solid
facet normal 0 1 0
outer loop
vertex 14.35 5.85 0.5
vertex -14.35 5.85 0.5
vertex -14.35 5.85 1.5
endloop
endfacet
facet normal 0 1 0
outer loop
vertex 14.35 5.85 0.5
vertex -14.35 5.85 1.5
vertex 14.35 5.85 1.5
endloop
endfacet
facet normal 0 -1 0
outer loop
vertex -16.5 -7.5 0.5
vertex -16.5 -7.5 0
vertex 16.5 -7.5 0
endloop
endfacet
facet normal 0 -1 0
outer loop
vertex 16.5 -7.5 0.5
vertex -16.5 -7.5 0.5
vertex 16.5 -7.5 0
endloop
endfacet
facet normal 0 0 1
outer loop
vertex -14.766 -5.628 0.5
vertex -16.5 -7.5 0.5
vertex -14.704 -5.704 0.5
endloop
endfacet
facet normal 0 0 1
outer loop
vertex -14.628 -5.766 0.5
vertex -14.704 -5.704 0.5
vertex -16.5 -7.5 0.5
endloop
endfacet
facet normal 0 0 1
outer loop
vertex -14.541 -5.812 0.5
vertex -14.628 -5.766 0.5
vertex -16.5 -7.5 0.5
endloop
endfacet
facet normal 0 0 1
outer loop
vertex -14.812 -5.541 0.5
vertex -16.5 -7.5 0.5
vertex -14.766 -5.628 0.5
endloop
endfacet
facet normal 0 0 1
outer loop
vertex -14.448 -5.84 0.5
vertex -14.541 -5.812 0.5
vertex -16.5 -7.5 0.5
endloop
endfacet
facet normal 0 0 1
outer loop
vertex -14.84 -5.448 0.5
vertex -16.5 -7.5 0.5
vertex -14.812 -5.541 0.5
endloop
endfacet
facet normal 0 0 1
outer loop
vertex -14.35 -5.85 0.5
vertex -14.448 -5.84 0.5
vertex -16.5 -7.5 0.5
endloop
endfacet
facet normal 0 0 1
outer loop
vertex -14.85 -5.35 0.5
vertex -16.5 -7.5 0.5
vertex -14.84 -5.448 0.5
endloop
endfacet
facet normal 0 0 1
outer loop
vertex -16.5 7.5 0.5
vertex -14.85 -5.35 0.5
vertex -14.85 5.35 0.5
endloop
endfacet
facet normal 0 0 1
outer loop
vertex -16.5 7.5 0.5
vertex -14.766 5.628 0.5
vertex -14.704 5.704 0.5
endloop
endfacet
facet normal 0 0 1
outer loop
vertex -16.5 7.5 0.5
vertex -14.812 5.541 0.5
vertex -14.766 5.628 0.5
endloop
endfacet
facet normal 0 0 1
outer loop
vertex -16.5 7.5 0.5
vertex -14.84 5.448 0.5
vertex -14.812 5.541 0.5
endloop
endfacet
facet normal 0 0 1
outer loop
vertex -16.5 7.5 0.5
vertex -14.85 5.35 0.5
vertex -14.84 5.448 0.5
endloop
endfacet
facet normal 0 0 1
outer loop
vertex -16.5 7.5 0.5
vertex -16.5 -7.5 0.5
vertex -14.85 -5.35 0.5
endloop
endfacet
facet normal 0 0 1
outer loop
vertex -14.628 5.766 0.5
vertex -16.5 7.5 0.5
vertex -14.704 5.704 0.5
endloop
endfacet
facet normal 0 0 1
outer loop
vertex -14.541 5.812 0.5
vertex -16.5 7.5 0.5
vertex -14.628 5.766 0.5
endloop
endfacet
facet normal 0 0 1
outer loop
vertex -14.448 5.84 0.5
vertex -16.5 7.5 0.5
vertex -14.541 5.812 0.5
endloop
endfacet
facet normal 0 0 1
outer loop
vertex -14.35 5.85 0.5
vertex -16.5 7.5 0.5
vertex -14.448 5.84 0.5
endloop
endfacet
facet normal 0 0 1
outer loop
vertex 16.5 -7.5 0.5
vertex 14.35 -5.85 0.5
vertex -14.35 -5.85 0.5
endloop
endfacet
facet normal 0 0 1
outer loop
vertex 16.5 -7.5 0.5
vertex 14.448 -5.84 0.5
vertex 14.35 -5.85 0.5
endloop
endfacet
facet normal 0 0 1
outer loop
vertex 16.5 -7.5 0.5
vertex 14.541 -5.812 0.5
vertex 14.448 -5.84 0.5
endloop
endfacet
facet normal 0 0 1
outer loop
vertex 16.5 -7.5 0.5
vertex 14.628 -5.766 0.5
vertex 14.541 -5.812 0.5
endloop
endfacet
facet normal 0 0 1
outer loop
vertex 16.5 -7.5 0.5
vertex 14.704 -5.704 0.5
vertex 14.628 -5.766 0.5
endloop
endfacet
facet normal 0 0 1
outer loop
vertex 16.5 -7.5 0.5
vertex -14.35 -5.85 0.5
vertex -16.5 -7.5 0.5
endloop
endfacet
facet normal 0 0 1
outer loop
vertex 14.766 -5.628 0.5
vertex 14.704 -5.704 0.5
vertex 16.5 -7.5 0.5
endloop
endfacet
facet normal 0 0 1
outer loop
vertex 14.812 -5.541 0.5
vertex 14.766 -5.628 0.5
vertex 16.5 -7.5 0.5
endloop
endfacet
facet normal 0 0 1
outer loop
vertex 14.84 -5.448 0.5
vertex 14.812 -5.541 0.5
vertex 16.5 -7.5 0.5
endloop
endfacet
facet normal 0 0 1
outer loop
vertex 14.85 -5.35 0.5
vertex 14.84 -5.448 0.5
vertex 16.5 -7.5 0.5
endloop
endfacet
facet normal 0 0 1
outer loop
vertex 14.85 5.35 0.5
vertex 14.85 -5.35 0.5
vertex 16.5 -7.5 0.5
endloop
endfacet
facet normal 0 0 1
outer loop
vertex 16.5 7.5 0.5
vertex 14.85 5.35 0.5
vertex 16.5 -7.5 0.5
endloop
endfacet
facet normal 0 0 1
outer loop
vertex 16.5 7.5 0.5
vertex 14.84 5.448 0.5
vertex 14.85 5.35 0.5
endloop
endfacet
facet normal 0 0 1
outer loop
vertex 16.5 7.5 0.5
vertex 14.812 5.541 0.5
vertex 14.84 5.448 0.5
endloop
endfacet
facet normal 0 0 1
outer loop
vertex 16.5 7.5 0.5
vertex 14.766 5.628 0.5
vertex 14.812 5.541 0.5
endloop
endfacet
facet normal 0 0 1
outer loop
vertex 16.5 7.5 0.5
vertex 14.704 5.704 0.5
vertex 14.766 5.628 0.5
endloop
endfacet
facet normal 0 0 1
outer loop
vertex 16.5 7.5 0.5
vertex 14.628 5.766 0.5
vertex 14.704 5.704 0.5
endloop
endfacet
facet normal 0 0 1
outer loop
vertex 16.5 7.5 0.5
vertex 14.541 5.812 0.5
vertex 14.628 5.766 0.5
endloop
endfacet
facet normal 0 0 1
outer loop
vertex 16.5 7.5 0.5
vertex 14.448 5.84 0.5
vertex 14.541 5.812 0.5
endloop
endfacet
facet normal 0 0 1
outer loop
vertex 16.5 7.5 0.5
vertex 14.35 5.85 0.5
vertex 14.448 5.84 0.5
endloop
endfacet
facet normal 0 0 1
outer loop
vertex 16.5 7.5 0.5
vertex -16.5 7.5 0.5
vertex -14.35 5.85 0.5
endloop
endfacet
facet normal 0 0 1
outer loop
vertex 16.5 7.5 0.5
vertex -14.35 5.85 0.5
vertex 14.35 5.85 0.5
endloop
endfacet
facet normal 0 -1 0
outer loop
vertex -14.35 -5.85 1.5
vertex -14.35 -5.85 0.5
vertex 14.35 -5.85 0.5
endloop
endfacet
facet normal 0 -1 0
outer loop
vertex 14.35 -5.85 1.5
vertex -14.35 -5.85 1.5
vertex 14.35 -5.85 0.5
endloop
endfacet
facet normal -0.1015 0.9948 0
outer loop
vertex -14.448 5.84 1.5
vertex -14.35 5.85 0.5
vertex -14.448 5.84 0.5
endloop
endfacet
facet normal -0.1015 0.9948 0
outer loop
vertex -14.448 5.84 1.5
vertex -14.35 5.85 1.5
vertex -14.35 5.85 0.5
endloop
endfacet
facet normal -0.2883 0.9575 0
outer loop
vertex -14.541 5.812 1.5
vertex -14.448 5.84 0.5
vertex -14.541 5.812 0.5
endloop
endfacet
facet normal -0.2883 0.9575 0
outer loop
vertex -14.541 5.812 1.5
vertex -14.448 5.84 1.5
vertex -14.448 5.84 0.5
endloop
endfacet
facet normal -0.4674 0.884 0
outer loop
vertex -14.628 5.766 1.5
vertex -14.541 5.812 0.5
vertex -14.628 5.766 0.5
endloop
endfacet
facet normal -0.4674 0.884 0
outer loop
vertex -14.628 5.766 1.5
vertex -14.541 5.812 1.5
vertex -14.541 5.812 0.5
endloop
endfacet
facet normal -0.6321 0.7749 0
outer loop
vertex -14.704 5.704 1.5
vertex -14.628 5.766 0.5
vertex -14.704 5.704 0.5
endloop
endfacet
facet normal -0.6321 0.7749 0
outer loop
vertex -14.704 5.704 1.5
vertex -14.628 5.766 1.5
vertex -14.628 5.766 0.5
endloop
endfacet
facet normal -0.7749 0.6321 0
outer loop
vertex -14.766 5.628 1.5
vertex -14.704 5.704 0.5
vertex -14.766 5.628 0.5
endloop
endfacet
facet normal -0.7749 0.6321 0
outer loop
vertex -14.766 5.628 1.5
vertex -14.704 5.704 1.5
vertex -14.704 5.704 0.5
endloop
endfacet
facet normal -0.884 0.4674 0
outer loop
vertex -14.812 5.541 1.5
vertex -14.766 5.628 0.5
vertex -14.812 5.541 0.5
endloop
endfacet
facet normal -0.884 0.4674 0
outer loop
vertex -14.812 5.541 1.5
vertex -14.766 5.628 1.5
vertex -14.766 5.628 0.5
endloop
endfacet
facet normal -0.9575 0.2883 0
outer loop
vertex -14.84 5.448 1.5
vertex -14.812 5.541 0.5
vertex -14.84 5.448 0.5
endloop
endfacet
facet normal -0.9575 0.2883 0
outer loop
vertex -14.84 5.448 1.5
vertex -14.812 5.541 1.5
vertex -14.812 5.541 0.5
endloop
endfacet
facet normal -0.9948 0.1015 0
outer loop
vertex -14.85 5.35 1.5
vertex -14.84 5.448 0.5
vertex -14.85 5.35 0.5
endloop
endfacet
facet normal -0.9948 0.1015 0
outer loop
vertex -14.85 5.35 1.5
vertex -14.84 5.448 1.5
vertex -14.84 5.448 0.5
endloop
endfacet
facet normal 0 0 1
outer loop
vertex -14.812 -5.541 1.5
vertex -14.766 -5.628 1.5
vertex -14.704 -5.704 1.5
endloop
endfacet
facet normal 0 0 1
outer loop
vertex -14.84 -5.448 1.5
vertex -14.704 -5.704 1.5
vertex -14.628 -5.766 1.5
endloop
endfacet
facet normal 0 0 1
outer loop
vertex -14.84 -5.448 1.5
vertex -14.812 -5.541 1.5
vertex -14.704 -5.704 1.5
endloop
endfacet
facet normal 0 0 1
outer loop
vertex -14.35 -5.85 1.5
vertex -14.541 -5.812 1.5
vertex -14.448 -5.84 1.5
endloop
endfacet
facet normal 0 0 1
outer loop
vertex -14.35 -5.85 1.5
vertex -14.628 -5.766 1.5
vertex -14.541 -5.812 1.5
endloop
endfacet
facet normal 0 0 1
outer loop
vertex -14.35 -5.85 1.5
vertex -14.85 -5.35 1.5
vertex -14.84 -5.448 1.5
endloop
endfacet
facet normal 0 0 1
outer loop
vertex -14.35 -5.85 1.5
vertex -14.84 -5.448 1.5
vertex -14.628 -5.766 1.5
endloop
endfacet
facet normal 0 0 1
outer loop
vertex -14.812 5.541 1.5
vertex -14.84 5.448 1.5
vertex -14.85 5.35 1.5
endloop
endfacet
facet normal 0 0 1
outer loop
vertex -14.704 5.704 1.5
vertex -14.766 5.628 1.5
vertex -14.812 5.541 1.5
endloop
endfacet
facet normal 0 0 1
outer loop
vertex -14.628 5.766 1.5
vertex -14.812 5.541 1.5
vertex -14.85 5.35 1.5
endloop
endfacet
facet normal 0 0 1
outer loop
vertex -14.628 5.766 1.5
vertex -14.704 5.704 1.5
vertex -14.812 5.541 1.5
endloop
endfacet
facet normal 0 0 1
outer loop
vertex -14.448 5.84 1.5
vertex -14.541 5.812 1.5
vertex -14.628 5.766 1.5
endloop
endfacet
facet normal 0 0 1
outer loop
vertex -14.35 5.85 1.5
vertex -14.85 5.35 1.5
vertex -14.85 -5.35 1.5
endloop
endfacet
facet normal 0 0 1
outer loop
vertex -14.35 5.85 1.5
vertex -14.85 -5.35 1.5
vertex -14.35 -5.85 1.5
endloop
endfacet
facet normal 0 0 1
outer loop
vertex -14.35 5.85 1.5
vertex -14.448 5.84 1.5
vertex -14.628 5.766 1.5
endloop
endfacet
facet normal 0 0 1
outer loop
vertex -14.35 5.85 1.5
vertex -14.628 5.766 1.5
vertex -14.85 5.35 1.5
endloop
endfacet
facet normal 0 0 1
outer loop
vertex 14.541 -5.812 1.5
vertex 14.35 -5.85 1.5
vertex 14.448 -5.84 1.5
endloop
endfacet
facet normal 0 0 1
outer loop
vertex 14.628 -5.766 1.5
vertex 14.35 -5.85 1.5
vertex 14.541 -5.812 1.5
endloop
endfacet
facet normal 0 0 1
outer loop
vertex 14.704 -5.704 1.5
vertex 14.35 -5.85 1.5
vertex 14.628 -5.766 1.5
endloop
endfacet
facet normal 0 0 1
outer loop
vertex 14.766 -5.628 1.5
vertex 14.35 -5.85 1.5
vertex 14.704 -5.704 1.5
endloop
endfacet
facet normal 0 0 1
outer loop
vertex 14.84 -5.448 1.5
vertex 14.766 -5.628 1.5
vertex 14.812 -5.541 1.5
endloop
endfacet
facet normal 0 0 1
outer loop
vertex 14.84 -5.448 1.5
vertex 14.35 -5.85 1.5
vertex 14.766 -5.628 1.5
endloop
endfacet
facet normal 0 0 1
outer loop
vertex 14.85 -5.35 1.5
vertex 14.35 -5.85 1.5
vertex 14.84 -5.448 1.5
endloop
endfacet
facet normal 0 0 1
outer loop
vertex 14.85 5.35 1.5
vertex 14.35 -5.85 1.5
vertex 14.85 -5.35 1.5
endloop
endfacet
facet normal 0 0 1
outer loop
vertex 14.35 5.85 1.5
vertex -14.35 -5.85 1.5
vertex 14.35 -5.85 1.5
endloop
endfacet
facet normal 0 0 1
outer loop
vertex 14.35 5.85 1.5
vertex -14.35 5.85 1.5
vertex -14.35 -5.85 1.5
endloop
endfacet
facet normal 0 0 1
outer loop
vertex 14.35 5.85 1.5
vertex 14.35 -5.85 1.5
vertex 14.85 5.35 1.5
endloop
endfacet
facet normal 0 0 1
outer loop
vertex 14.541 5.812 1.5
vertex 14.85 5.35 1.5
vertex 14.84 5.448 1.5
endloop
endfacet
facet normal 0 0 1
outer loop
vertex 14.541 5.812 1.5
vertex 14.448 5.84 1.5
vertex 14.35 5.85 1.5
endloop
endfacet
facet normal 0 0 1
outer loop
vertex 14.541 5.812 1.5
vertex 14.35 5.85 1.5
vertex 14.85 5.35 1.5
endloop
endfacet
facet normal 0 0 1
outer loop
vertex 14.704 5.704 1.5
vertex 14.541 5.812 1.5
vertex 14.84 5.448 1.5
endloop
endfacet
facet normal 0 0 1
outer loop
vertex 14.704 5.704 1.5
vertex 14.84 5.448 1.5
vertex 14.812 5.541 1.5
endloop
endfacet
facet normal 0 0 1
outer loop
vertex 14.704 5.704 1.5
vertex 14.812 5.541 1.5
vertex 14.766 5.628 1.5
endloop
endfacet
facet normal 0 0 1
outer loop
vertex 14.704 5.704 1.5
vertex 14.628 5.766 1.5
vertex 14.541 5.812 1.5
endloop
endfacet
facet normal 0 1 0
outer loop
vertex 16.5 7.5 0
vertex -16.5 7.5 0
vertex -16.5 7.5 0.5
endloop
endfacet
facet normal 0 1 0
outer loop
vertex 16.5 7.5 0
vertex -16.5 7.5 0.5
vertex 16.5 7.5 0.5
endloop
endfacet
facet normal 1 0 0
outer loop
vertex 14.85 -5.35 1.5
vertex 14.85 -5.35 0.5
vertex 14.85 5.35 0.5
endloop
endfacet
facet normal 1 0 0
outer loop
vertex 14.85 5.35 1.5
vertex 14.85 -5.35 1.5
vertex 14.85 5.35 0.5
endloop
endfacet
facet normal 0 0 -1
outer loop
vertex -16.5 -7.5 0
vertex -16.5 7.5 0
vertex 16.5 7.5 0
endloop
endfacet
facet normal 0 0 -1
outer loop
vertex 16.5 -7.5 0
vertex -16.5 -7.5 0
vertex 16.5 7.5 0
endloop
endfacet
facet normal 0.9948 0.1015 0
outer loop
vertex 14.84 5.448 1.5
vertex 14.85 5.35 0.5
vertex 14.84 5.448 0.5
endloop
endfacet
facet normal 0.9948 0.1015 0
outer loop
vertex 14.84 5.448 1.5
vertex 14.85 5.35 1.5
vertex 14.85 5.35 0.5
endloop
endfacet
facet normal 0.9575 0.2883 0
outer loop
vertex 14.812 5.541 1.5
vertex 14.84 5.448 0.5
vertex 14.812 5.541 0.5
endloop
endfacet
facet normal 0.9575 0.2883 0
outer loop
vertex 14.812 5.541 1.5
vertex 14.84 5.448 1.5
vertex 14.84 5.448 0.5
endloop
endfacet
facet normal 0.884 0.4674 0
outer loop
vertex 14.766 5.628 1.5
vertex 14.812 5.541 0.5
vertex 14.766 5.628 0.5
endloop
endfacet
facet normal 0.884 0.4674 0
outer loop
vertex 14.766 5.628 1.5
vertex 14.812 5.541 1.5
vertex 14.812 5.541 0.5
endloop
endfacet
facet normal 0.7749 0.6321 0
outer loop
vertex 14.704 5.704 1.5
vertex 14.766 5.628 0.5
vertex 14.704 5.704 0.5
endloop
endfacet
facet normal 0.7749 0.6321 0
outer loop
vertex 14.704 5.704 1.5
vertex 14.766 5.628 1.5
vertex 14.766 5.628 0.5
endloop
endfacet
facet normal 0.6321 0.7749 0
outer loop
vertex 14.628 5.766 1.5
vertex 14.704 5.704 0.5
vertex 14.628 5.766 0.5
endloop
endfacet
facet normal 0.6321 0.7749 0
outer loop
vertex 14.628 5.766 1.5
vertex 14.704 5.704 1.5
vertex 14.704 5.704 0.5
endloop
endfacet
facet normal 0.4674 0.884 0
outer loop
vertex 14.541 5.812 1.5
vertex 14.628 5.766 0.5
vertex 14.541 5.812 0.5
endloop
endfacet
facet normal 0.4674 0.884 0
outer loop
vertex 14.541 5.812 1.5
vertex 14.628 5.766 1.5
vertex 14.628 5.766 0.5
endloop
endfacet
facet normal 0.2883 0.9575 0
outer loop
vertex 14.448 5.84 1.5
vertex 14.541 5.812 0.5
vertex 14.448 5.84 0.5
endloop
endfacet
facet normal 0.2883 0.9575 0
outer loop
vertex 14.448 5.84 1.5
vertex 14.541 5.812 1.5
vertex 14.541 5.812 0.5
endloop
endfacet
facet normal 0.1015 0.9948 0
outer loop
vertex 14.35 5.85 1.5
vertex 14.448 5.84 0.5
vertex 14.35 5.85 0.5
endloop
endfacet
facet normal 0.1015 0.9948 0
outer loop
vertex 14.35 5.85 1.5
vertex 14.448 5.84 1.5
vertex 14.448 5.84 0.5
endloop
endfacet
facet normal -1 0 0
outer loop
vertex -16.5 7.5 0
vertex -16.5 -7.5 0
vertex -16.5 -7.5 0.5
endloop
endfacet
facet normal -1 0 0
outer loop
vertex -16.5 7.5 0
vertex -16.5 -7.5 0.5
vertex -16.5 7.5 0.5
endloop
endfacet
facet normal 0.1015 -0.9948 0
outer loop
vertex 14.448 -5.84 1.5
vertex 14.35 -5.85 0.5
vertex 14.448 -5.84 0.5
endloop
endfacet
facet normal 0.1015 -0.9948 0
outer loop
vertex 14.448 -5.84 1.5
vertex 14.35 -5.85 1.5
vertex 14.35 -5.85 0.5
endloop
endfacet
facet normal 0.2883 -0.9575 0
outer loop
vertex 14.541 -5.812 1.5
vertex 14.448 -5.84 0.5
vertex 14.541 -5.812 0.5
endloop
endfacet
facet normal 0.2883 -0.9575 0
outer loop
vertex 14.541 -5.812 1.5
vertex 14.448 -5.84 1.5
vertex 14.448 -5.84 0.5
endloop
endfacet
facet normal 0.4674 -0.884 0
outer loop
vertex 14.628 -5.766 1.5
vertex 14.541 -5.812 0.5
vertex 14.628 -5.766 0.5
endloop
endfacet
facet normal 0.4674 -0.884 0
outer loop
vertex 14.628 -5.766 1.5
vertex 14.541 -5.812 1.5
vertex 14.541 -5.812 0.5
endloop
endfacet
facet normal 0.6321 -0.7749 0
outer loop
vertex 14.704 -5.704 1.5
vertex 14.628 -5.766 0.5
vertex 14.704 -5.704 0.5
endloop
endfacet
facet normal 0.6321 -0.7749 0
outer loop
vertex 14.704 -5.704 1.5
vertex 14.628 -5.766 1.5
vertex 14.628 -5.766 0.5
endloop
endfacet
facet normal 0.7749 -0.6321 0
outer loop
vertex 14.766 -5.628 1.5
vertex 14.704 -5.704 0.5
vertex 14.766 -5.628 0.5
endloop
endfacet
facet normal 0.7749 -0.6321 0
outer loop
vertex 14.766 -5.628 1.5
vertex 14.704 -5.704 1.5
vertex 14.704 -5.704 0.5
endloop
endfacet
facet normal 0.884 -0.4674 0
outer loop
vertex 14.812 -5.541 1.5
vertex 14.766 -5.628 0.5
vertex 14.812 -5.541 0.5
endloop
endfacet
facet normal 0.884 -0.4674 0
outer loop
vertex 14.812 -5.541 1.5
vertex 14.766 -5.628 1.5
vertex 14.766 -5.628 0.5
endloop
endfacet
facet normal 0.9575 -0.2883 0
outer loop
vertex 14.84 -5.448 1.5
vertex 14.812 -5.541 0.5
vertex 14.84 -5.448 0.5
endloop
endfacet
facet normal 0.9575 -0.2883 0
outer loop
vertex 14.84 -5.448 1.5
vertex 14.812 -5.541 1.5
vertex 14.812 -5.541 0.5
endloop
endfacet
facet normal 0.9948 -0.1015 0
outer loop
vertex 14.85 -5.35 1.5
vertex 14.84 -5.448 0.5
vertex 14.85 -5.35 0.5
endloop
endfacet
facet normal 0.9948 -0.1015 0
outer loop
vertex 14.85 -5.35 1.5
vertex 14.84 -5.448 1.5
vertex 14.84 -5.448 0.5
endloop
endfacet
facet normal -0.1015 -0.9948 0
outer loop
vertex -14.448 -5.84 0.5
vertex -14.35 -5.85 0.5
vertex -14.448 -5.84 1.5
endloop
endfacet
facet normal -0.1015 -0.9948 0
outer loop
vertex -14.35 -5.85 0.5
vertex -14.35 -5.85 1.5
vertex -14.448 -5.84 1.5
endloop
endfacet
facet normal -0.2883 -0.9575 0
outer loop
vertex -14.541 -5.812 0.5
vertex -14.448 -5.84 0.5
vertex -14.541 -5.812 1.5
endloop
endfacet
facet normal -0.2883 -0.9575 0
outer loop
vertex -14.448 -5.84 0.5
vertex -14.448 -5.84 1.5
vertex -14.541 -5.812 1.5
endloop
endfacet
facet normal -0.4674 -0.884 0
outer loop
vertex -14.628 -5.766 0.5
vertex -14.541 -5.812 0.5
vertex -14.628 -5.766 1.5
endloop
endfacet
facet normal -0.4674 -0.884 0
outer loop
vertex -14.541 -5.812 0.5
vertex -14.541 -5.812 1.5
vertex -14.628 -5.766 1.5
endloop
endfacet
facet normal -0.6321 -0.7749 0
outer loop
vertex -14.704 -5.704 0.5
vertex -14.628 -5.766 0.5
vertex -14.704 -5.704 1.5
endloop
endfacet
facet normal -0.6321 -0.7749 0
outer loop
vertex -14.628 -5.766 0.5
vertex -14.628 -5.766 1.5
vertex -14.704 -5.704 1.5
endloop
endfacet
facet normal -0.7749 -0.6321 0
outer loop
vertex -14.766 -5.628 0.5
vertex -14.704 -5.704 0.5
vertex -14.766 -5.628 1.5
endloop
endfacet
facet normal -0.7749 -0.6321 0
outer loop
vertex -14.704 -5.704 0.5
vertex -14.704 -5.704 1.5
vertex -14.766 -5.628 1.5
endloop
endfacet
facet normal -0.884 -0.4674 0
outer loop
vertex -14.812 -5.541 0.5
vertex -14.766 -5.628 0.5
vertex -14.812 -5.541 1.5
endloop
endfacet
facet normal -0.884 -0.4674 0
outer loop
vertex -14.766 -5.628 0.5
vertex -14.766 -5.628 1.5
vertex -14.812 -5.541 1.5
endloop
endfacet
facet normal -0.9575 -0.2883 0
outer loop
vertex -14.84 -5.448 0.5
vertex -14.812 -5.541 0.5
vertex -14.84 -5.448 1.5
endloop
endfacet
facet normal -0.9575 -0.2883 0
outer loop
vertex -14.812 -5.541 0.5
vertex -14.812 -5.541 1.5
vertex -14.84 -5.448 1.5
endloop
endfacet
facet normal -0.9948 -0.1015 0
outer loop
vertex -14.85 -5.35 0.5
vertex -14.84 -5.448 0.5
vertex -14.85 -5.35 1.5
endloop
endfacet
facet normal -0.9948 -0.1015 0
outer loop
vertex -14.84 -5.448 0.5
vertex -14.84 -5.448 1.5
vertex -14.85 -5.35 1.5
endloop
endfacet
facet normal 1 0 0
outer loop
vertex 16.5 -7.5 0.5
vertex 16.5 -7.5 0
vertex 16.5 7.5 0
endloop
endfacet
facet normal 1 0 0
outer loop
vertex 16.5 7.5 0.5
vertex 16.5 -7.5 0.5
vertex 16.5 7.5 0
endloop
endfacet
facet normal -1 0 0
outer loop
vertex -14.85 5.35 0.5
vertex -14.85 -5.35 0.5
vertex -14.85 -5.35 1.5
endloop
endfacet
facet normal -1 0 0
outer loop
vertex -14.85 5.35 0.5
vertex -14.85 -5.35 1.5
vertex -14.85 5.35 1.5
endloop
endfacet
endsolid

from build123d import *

# Parameters (mm, degrees)
SKETCH_W     = 33
SKETCH_H     = 15
PAD_DEPTH    = 0.5
SKETCH001_W  = 29.7
SKETCH001_H  = 11.7
PAD001_DEPTH = 1
FILLET_R     = 0.5


with BuildPart() as part:
    # Sketch → Pad (new body)
    with BuildSketch(Plane.XY):
        Rectangle(SKETCH_W, SKETCH_H)
    extrude(amount=PAD_DEPTH)

    # Sketch001 (on Face6 of Pad) → Pad001 (join)
    with BuildSketch(Plane.XY.offset(0.5)):
        Rectangle(SKETCH001_W, SKETCH001_H)
    extrude(amount=PAD001_DEPTH)

    # Fillet
    fillet_edges = [part.edges().sort_by_distance(p)[0] for p in [
        (-14.85, -5.85, 1),
        (14.85, -5.85, 1),
        (14.85, 5.85, 1),
        (-14.85, 5.85, 1),
    ]]
    fillet(fillet_edges, radius=FILLET_R)


solid = part.part
